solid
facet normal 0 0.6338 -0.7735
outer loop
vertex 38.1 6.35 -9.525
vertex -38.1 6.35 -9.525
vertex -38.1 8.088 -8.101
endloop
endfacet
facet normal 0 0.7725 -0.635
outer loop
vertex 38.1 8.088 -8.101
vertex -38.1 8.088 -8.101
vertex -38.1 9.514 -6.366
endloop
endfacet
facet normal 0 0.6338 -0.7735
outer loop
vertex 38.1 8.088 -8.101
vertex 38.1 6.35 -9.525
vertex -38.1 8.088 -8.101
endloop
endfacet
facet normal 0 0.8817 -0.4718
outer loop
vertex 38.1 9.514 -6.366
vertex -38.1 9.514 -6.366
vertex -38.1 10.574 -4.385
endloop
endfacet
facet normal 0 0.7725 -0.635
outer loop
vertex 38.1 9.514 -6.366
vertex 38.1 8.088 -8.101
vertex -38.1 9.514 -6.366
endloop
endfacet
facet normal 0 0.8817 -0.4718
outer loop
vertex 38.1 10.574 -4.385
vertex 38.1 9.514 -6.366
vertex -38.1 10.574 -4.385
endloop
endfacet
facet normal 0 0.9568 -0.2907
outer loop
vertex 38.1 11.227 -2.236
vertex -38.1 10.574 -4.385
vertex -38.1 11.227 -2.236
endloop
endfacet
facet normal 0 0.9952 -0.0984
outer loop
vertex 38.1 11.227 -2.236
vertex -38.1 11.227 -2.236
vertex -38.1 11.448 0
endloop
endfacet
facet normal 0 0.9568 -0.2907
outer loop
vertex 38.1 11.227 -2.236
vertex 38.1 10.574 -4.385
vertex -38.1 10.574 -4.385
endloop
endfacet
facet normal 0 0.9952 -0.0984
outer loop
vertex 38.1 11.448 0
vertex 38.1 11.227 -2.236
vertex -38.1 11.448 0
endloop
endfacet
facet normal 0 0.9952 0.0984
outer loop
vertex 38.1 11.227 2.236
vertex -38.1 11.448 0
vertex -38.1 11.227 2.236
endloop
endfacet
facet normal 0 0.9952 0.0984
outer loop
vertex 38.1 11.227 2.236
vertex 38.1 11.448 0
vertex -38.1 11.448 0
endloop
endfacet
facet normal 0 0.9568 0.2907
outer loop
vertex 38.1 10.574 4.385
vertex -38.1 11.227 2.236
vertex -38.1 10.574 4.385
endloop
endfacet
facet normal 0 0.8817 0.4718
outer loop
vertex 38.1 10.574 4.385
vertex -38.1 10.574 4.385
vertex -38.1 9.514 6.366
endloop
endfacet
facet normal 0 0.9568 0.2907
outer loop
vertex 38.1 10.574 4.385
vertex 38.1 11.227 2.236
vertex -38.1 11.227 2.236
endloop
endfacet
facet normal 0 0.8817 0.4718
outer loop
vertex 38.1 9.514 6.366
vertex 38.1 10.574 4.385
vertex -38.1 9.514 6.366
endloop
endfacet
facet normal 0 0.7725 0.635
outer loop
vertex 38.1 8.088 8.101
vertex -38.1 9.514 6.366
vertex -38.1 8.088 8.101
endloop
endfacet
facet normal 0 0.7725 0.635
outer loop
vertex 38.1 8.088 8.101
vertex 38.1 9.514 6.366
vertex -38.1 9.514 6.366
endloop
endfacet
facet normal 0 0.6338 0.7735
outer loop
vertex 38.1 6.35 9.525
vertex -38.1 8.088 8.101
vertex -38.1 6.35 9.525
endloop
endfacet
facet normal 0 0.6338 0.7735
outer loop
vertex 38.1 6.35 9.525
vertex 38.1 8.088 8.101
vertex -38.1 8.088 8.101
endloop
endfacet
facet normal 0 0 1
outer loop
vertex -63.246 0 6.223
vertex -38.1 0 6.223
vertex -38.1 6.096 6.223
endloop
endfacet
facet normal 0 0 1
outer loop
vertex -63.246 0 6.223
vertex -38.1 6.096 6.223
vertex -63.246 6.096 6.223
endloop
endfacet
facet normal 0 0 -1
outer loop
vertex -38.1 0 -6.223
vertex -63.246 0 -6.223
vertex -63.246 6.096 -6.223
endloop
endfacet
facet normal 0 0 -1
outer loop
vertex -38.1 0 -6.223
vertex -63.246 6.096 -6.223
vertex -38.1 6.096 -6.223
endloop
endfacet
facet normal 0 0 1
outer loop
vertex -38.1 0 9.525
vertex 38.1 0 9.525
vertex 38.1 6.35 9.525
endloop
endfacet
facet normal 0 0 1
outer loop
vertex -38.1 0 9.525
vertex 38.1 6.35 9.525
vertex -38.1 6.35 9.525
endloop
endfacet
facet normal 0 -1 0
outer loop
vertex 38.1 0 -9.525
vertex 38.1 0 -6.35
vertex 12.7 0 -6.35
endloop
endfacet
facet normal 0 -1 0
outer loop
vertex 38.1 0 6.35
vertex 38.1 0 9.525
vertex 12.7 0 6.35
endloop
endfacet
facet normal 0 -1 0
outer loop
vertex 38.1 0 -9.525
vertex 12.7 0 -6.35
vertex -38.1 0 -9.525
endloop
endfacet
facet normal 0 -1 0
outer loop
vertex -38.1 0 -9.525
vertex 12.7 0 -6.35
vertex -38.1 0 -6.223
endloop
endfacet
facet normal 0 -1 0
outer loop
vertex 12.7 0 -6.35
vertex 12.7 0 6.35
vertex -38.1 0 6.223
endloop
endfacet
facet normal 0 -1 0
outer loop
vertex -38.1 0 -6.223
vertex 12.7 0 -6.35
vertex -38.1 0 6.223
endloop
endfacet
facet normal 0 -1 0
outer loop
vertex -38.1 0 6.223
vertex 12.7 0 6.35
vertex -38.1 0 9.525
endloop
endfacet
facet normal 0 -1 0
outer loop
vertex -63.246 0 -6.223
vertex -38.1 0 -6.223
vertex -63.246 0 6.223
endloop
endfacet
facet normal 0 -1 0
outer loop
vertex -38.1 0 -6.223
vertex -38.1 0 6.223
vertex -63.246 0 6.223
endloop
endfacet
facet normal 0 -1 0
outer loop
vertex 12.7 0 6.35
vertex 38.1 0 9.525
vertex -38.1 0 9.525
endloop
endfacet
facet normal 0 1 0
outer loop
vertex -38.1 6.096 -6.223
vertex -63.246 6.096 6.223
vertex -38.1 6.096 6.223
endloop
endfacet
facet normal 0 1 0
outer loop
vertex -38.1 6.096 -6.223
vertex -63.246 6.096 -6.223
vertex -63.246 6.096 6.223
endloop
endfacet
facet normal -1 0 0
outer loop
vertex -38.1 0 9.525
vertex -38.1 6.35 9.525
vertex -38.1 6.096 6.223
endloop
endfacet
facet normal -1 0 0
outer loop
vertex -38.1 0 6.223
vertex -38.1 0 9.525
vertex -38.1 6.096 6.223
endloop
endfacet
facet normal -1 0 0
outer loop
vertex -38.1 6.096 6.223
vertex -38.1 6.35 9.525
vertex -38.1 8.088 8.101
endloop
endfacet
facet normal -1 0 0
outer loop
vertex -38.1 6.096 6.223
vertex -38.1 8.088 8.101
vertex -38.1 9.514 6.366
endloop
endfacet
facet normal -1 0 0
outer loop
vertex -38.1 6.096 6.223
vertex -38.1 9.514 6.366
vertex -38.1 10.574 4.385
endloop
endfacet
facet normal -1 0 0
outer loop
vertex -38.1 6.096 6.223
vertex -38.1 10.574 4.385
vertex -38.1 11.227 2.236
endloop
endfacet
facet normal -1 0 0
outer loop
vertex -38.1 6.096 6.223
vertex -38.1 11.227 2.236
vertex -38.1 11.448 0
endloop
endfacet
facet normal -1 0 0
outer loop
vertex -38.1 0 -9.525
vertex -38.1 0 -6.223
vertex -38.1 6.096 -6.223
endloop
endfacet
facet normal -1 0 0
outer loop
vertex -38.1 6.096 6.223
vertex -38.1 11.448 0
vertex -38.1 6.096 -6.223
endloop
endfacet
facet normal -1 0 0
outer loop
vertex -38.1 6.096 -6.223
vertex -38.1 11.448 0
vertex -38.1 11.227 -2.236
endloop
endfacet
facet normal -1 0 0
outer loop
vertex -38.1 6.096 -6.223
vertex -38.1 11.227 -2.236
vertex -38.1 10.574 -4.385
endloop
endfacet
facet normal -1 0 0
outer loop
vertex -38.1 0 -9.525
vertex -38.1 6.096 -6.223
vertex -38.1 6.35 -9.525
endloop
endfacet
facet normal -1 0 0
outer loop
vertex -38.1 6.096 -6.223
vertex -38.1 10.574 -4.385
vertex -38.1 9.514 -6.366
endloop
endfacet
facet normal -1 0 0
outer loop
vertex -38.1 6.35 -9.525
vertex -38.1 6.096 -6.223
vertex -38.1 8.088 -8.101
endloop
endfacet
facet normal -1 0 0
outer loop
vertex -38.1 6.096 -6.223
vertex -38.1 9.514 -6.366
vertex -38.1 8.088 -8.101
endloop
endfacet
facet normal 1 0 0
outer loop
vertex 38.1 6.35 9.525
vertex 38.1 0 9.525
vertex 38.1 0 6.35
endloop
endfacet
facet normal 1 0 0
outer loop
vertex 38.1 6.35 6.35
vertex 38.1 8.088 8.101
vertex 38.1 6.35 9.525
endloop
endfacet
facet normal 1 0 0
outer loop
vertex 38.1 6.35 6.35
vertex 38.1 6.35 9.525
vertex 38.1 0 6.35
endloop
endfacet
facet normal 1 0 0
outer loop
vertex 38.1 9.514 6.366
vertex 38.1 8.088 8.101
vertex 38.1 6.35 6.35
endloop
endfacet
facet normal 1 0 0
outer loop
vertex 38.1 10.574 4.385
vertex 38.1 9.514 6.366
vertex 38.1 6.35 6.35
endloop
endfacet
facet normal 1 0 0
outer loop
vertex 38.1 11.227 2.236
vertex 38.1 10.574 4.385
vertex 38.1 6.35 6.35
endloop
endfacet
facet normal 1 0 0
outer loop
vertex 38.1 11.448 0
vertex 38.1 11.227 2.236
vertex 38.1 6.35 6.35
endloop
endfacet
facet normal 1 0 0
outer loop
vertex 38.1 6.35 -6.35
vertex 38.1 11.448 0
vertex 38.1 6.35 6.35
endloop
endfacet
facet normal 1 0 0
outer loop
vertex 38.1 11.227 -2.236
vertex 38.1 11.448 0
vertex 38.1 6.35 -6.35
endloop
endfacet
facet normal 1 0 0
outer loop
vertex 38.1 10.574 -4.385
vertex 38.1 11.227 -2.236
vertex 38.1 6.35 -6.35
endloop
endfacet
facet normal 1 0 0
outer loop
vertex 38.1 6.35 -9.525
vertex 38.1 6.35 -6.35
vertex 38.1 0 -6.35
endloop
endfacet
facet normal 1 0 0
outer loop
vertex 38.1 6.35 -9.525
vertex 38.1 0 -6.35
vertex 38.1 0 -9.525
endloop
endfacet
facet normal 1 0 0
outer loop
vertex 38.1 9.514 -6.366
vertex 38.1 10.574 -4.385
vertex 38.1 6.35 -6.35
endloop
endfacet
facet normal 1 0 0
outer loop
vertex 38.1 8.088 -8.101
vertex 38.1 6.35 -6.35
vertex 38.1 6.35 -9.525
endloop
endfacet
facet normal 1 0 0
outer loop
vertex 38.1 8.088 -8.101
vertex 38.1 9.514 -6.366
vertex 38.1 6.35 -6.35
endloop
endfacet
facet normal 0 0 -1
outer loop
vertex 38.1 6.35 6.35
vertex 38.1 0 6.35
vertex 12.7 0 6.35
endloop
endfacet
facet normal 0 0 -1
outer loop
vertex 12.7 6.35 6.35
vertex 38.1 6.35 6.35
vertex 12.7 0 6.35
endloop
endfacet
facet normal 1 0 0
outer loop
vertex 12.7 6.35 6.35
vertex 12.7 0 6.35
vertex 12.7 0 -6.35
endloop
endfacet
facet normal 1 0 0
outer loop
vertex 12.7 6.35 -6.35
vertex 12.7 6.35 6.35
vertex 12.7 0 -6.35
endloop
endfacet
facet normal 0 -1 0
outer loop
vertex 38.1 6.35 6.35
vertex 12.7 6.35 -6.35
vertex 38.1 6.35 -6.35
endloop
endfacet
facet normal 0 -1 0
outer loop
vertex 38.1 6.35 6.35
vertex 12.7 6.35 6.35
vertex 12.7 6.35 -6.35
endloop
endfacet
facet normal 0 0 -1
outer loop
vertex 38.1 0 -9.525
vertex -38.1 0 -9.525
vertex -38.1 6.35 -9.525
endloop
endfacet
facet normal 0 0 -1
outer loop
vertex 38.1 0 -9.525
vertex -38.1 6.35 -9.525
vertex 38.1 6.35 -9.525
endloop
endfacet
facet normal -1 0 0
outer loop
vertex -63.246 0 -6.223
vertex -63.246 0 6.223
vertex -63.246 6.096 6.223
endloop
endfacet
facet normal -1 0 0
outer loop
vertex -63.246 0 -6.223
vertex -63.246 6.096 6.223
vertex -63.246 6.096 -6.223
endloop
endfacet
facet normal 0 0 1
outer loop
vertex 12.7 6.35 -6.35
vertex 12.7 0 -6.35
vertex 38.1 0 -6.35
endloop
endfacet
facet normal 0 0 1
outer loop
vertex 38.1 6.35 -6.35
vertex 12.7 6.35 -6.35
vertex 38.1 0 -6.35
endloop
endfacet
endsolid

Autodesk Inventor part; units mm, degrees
ref_plane "YZ Plane" through (0, 0, 0) normal (1, 0, 0) x (0, 1, 0)
ref_plane "XZ Plane" through (0, 0, 0) normal (0, 1, 0) x (-1, 0, 0)
ref_plane "XY Plane" through (0, 0, 0) normal (0, 0, 1) x (1, 0, 0)
sketch "Sketch1" plane through (0, 0, 0) normal (0, 1, 0) x (-1, 0, 0)
  line L0 (-38.1, 9.525) -> (38.1, 9.525)
  line L1 (38.1, 9.525) -> (38.1, -9.525)
  line L2 (38.1, -9.525) -> (-38.1, -9.525)
  line L3 (-38.1, -9.525) -> (-38.1, 9.525)
  line L4 (38.1, 6.223) -> (63.246, 6.223)
  line L5 (63.246, 6.223) -> (63.246, -6.223)
  line L6 (63.246, -6.223) -> (38.1, -6.223)
  line L7 (38.1, -6.223) -> (38.1, 6.223)
  point P0 (0, 0)
  point P1 (38.1, 0)
  dimension "d0" = 76.2
  dimension "d1" = 19.05
  dimension "d2" = 9.525
  dimension "d3" = 38.1
  dimension "d4" = 25.146
  dimension "d5" = 12.446
  dimension "d6" = 6.223
extrude "Extrusion1" add sketch "Sketch1" along normal blind 6.35
sketch "Sketch2" plane through (38.1, 0, 9.525) normal (1, 0, 0) x (0, 0, -1)
  line L0 (0, 0) -> (19.05, 0) projected
  line L1 (19.05, 0) -> (19.05, 6.35) projected
  line L2 (0, 6.35) -> (19.05, 6.35) projected
  line L3 (0, 0) -> (0, 6.35) projected
  line L4 (19.05, 0) -> (19.05, 6.35) projected
  line L5 (0, 0) -> (0, 6.35) projected
  arc A0 (19.05, 6.35) -> (0, 6.35) centre (9.525, 0) ccw
  point P0 (9.525, 0)
extrude "Extrusion2" add sketch "Sketch2" against normal blind 76.2 contours A0 L2
sketch "Sketch3" plane through (0, 0, 0) normal (0, -1, 0) x (1, 0, 0)
  line L0 (38.1, 9.525) -> (38.1, -9.525) projected
  line L1 (-38.1, 9.525) -> (38.1, 9.525) projected
  line L2 (-38.1, 6.223) -> (-38.1, 9.525) projected
  line L3 (-63.246, 6.223) -> (-38.1, 6.223) projected
  line L4 (-63.246, -6.223) -> (-63.246, 6.223) projected
  line L5 (-38.1, -6.223) -> (-63.246, -6.223) projected
  line L6 (-38.1, -9.525) -> (-38.1, -6.223) projected
  line L7 (38.1, -9.525) -> (-38.1, -9.525) projected
  line L8 (38.1, -9.525) -> (38.1, 9.525) projected
  line L9 (38.1, 6.35) -> (12.7, 6.35)
  line L10 (12.7, 6.35) -> (12.7, -6.35)
  line L11 (12.7, -6.35) -> (38.1, -6.35)
  line L12 (38.1, -6.35) -> (38.1, 6.35)
  point P0 (0, 0)
  point P1 (38.1, 0)
  dimension "d11" = 12.7
  dimension "d12" = 12.446
  dimension "d13" = 6.35
  dimension "d14" = 25.4
extrude "Extrusion3" cut sketch "Sketch3" against normal blind 6.35 contours L0 L11 L10 L9
sketch "Sketch4" plane through (0, 6.35, 0) normal (0, 1, 0) x (1, 0, 0)
  line L0 (-38.1, -6.223) -> (-38.1, 6.223) projected
  line L1 (-38.1, 6.223) -> (-63.246, 6.223) projected
  line L2 (-63.246, 6.223) -> (-63.246, -6.223) projected
  line L3 (-63.246, -6.223) -> (-38.1, -6.223) projected
  point P0 (0, 0)
extrude "Extrusion4" cut sketch "Sketch4" against normal blind 0.254
equation "\"d2\" = 0.5 * d1"
equation "\"d3\" = 0.5 * d0"
equation "\"d6\" = 0.5 * d5"
equation "\"d13\" = 0.5 * d11"
properties part number "Part_3_hand_extention"
